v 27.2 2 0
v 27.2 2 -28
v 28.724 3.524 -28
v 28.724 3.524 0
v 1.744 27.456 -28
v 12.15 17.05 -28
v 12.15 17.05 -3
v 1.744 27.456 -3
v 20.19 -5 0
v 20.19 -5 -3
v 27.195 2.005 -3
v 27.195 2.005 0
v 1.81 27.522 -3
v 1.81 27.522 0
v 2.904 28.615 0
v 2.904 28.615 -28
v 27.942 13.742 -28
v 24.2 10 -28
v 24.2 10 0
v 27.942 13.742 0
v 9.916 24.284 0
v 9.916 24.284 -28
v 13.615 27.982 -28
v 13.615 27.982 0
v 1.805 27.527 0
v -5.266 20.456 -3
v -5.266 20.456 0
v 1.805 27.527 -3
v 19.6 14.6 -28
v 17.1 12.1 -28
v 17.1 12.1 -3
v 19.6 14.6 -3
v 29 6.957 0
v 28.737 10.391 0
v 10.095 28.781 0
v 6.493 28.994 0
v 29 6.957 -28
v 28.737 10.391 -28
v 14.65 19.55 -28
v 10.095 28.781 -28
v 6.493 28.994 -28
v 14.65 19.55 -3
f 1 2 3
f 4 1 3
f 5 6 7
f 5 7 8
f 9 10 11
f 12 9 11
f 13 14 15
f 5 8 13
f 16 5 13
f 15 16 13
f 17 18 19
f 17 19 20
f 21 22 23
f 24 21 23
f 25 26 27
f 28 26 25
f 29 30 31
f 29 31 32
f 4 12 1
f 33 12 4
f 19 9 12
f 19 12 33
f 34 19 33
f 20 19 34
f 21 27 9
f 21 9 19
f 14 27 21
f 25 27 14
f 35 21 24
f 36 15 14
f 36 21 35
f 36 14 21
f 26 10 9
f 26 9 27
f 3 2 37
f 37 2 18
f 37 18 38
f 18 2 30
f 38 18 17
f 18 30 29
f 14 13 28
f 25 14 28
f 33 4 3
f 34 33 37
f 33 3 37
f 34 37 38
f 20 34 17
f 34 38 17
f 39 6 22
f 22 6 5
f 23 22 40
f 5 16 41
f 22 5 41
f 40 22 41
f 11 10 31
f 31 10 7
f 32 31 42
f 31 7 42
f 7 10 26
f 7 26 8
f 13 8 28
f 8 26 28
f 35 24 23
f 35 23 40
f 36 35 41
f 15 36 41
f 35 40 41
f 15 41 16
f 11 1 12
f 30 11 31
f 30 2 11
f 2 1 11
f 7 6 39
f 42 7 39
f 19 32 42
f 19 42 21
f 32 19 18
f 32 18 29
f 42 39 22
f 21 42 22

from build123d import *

# Parameters (mm, degrees)
BOX044_W               = 4
BOX044_H               = 7
BOX044_DEPTH           = 25
BOX044_PLACEMENT_ANGLE = 45
CYLINDER100_R          = 22
CYLINDER100_DEPTH      = 28
BOX042_W               = 26.5
BOX042_H               = 20.2
BOX042_DEPTH           = 28
BOX042_PLACEMENT_ANGLE = 45
BOX043_W               = 16.5
BOX043_H               = 36
BOX043_DEPTH           = 28
BOX043_PLACEMENT_ANGLE = 45
BOX045_W               = 10
BOX045_H               = 36
BOX045_DEPTH           = 3
BOX045_PLACEMENT_ANGLE = 45


with BuildPart() as cube023:
    # Box044 → Box044 (new body)
    with BuildSketch(Plane.XY):
        with Locations((2, 3.5)):
            Rectangle(BOX044_W, BOX044_H)
    extrude(amount=BOX044_DEPTH)


with BuildPart() as cube023_1:
    # Box044 placement: moved
    add(cube023.part.moved(Location((17, 12, -28))).rotate(Axis((17, 12, -28), (0, 0, 1)), BOX044_PLACEMENT_ANGLE))


with BuildPart() as cylinder100:
    # Cylinder100 → Cylinder100 (new body)
    with BuildSketch(Plane(origin=(7, 7, -28), x_dir=(1, 0, 0), z_dir=(0, 0, 1))):
        Circle(CYLINDER100_R)
    extrude(amount=CYLINDER100_DEPTH)


with BuildPart() as inner001:
    # Box042 → Box042 (new body)
    with BuildSketch(Plane.XY):
        with Locations((13.25, 10.1)):
            Rectangle(BOX042_W, BOX042_H)
    extrude(amount=BOX042_DEPTH)


with BuildPart() as inner001_1:
    # Box042 placement: moved
    add(inner001.part.moved(Location((24.2, 10, -28))).rotate(Axis((24.2, 10, -28), (0, 0, 1)), BOX042_PLACEMENT_ANGLE))


with BuildPart() as cut106:
    # Box043 → Box043 (new body)
    with BuildSketch(Plane.XY):
        with Locations((8.25, 18)):
            Rectangle(BOX043_W, BOX043_H)
    extrude(amount=BOX043_DEPTH)


with BuildPart() as cut106_1:
    # Box043 placement: moved
    add(cut106.part.moved(Location((27.2, 2, -28))).rotate(Axis((27.2, 2, -28), (0, 0, 1)), BOX043_PLACEMENT_ANGLE))

    # Cut105: cut inner001
    add(inner001_1.part, mode=Mode.SUBTRACT)

    # Common007: intersect Cylinder100
    add(cylinder100.part, mode=Mode.INTERSECT)

    # Cut106: cut Cube023
    add(cube023_1.part, mode=Mode.SUBTRACT)


with BuildPart() as fusion030:
    # Box045 → Box045 (new body)
    with BuildSketch(Plane.XY):
        with Locations((5, 18)):
            Rectangle(BOX045_W, BOX045_H)
    extrude(amount=BOX045_DEPTH)


with BuildPart() as fusion030_1:
    # Box045 placement: moved
    add(fusion030.part.moved(Location((20.19, -5, -3))).rotate(Axis((20.19, -5, -3), (0, 0, 1)), BOX045_PLACEMENT_ANGLE))

    # Fusion030: union Cut106
    add(cut106_1.part)


solid = fusion030_1.part
